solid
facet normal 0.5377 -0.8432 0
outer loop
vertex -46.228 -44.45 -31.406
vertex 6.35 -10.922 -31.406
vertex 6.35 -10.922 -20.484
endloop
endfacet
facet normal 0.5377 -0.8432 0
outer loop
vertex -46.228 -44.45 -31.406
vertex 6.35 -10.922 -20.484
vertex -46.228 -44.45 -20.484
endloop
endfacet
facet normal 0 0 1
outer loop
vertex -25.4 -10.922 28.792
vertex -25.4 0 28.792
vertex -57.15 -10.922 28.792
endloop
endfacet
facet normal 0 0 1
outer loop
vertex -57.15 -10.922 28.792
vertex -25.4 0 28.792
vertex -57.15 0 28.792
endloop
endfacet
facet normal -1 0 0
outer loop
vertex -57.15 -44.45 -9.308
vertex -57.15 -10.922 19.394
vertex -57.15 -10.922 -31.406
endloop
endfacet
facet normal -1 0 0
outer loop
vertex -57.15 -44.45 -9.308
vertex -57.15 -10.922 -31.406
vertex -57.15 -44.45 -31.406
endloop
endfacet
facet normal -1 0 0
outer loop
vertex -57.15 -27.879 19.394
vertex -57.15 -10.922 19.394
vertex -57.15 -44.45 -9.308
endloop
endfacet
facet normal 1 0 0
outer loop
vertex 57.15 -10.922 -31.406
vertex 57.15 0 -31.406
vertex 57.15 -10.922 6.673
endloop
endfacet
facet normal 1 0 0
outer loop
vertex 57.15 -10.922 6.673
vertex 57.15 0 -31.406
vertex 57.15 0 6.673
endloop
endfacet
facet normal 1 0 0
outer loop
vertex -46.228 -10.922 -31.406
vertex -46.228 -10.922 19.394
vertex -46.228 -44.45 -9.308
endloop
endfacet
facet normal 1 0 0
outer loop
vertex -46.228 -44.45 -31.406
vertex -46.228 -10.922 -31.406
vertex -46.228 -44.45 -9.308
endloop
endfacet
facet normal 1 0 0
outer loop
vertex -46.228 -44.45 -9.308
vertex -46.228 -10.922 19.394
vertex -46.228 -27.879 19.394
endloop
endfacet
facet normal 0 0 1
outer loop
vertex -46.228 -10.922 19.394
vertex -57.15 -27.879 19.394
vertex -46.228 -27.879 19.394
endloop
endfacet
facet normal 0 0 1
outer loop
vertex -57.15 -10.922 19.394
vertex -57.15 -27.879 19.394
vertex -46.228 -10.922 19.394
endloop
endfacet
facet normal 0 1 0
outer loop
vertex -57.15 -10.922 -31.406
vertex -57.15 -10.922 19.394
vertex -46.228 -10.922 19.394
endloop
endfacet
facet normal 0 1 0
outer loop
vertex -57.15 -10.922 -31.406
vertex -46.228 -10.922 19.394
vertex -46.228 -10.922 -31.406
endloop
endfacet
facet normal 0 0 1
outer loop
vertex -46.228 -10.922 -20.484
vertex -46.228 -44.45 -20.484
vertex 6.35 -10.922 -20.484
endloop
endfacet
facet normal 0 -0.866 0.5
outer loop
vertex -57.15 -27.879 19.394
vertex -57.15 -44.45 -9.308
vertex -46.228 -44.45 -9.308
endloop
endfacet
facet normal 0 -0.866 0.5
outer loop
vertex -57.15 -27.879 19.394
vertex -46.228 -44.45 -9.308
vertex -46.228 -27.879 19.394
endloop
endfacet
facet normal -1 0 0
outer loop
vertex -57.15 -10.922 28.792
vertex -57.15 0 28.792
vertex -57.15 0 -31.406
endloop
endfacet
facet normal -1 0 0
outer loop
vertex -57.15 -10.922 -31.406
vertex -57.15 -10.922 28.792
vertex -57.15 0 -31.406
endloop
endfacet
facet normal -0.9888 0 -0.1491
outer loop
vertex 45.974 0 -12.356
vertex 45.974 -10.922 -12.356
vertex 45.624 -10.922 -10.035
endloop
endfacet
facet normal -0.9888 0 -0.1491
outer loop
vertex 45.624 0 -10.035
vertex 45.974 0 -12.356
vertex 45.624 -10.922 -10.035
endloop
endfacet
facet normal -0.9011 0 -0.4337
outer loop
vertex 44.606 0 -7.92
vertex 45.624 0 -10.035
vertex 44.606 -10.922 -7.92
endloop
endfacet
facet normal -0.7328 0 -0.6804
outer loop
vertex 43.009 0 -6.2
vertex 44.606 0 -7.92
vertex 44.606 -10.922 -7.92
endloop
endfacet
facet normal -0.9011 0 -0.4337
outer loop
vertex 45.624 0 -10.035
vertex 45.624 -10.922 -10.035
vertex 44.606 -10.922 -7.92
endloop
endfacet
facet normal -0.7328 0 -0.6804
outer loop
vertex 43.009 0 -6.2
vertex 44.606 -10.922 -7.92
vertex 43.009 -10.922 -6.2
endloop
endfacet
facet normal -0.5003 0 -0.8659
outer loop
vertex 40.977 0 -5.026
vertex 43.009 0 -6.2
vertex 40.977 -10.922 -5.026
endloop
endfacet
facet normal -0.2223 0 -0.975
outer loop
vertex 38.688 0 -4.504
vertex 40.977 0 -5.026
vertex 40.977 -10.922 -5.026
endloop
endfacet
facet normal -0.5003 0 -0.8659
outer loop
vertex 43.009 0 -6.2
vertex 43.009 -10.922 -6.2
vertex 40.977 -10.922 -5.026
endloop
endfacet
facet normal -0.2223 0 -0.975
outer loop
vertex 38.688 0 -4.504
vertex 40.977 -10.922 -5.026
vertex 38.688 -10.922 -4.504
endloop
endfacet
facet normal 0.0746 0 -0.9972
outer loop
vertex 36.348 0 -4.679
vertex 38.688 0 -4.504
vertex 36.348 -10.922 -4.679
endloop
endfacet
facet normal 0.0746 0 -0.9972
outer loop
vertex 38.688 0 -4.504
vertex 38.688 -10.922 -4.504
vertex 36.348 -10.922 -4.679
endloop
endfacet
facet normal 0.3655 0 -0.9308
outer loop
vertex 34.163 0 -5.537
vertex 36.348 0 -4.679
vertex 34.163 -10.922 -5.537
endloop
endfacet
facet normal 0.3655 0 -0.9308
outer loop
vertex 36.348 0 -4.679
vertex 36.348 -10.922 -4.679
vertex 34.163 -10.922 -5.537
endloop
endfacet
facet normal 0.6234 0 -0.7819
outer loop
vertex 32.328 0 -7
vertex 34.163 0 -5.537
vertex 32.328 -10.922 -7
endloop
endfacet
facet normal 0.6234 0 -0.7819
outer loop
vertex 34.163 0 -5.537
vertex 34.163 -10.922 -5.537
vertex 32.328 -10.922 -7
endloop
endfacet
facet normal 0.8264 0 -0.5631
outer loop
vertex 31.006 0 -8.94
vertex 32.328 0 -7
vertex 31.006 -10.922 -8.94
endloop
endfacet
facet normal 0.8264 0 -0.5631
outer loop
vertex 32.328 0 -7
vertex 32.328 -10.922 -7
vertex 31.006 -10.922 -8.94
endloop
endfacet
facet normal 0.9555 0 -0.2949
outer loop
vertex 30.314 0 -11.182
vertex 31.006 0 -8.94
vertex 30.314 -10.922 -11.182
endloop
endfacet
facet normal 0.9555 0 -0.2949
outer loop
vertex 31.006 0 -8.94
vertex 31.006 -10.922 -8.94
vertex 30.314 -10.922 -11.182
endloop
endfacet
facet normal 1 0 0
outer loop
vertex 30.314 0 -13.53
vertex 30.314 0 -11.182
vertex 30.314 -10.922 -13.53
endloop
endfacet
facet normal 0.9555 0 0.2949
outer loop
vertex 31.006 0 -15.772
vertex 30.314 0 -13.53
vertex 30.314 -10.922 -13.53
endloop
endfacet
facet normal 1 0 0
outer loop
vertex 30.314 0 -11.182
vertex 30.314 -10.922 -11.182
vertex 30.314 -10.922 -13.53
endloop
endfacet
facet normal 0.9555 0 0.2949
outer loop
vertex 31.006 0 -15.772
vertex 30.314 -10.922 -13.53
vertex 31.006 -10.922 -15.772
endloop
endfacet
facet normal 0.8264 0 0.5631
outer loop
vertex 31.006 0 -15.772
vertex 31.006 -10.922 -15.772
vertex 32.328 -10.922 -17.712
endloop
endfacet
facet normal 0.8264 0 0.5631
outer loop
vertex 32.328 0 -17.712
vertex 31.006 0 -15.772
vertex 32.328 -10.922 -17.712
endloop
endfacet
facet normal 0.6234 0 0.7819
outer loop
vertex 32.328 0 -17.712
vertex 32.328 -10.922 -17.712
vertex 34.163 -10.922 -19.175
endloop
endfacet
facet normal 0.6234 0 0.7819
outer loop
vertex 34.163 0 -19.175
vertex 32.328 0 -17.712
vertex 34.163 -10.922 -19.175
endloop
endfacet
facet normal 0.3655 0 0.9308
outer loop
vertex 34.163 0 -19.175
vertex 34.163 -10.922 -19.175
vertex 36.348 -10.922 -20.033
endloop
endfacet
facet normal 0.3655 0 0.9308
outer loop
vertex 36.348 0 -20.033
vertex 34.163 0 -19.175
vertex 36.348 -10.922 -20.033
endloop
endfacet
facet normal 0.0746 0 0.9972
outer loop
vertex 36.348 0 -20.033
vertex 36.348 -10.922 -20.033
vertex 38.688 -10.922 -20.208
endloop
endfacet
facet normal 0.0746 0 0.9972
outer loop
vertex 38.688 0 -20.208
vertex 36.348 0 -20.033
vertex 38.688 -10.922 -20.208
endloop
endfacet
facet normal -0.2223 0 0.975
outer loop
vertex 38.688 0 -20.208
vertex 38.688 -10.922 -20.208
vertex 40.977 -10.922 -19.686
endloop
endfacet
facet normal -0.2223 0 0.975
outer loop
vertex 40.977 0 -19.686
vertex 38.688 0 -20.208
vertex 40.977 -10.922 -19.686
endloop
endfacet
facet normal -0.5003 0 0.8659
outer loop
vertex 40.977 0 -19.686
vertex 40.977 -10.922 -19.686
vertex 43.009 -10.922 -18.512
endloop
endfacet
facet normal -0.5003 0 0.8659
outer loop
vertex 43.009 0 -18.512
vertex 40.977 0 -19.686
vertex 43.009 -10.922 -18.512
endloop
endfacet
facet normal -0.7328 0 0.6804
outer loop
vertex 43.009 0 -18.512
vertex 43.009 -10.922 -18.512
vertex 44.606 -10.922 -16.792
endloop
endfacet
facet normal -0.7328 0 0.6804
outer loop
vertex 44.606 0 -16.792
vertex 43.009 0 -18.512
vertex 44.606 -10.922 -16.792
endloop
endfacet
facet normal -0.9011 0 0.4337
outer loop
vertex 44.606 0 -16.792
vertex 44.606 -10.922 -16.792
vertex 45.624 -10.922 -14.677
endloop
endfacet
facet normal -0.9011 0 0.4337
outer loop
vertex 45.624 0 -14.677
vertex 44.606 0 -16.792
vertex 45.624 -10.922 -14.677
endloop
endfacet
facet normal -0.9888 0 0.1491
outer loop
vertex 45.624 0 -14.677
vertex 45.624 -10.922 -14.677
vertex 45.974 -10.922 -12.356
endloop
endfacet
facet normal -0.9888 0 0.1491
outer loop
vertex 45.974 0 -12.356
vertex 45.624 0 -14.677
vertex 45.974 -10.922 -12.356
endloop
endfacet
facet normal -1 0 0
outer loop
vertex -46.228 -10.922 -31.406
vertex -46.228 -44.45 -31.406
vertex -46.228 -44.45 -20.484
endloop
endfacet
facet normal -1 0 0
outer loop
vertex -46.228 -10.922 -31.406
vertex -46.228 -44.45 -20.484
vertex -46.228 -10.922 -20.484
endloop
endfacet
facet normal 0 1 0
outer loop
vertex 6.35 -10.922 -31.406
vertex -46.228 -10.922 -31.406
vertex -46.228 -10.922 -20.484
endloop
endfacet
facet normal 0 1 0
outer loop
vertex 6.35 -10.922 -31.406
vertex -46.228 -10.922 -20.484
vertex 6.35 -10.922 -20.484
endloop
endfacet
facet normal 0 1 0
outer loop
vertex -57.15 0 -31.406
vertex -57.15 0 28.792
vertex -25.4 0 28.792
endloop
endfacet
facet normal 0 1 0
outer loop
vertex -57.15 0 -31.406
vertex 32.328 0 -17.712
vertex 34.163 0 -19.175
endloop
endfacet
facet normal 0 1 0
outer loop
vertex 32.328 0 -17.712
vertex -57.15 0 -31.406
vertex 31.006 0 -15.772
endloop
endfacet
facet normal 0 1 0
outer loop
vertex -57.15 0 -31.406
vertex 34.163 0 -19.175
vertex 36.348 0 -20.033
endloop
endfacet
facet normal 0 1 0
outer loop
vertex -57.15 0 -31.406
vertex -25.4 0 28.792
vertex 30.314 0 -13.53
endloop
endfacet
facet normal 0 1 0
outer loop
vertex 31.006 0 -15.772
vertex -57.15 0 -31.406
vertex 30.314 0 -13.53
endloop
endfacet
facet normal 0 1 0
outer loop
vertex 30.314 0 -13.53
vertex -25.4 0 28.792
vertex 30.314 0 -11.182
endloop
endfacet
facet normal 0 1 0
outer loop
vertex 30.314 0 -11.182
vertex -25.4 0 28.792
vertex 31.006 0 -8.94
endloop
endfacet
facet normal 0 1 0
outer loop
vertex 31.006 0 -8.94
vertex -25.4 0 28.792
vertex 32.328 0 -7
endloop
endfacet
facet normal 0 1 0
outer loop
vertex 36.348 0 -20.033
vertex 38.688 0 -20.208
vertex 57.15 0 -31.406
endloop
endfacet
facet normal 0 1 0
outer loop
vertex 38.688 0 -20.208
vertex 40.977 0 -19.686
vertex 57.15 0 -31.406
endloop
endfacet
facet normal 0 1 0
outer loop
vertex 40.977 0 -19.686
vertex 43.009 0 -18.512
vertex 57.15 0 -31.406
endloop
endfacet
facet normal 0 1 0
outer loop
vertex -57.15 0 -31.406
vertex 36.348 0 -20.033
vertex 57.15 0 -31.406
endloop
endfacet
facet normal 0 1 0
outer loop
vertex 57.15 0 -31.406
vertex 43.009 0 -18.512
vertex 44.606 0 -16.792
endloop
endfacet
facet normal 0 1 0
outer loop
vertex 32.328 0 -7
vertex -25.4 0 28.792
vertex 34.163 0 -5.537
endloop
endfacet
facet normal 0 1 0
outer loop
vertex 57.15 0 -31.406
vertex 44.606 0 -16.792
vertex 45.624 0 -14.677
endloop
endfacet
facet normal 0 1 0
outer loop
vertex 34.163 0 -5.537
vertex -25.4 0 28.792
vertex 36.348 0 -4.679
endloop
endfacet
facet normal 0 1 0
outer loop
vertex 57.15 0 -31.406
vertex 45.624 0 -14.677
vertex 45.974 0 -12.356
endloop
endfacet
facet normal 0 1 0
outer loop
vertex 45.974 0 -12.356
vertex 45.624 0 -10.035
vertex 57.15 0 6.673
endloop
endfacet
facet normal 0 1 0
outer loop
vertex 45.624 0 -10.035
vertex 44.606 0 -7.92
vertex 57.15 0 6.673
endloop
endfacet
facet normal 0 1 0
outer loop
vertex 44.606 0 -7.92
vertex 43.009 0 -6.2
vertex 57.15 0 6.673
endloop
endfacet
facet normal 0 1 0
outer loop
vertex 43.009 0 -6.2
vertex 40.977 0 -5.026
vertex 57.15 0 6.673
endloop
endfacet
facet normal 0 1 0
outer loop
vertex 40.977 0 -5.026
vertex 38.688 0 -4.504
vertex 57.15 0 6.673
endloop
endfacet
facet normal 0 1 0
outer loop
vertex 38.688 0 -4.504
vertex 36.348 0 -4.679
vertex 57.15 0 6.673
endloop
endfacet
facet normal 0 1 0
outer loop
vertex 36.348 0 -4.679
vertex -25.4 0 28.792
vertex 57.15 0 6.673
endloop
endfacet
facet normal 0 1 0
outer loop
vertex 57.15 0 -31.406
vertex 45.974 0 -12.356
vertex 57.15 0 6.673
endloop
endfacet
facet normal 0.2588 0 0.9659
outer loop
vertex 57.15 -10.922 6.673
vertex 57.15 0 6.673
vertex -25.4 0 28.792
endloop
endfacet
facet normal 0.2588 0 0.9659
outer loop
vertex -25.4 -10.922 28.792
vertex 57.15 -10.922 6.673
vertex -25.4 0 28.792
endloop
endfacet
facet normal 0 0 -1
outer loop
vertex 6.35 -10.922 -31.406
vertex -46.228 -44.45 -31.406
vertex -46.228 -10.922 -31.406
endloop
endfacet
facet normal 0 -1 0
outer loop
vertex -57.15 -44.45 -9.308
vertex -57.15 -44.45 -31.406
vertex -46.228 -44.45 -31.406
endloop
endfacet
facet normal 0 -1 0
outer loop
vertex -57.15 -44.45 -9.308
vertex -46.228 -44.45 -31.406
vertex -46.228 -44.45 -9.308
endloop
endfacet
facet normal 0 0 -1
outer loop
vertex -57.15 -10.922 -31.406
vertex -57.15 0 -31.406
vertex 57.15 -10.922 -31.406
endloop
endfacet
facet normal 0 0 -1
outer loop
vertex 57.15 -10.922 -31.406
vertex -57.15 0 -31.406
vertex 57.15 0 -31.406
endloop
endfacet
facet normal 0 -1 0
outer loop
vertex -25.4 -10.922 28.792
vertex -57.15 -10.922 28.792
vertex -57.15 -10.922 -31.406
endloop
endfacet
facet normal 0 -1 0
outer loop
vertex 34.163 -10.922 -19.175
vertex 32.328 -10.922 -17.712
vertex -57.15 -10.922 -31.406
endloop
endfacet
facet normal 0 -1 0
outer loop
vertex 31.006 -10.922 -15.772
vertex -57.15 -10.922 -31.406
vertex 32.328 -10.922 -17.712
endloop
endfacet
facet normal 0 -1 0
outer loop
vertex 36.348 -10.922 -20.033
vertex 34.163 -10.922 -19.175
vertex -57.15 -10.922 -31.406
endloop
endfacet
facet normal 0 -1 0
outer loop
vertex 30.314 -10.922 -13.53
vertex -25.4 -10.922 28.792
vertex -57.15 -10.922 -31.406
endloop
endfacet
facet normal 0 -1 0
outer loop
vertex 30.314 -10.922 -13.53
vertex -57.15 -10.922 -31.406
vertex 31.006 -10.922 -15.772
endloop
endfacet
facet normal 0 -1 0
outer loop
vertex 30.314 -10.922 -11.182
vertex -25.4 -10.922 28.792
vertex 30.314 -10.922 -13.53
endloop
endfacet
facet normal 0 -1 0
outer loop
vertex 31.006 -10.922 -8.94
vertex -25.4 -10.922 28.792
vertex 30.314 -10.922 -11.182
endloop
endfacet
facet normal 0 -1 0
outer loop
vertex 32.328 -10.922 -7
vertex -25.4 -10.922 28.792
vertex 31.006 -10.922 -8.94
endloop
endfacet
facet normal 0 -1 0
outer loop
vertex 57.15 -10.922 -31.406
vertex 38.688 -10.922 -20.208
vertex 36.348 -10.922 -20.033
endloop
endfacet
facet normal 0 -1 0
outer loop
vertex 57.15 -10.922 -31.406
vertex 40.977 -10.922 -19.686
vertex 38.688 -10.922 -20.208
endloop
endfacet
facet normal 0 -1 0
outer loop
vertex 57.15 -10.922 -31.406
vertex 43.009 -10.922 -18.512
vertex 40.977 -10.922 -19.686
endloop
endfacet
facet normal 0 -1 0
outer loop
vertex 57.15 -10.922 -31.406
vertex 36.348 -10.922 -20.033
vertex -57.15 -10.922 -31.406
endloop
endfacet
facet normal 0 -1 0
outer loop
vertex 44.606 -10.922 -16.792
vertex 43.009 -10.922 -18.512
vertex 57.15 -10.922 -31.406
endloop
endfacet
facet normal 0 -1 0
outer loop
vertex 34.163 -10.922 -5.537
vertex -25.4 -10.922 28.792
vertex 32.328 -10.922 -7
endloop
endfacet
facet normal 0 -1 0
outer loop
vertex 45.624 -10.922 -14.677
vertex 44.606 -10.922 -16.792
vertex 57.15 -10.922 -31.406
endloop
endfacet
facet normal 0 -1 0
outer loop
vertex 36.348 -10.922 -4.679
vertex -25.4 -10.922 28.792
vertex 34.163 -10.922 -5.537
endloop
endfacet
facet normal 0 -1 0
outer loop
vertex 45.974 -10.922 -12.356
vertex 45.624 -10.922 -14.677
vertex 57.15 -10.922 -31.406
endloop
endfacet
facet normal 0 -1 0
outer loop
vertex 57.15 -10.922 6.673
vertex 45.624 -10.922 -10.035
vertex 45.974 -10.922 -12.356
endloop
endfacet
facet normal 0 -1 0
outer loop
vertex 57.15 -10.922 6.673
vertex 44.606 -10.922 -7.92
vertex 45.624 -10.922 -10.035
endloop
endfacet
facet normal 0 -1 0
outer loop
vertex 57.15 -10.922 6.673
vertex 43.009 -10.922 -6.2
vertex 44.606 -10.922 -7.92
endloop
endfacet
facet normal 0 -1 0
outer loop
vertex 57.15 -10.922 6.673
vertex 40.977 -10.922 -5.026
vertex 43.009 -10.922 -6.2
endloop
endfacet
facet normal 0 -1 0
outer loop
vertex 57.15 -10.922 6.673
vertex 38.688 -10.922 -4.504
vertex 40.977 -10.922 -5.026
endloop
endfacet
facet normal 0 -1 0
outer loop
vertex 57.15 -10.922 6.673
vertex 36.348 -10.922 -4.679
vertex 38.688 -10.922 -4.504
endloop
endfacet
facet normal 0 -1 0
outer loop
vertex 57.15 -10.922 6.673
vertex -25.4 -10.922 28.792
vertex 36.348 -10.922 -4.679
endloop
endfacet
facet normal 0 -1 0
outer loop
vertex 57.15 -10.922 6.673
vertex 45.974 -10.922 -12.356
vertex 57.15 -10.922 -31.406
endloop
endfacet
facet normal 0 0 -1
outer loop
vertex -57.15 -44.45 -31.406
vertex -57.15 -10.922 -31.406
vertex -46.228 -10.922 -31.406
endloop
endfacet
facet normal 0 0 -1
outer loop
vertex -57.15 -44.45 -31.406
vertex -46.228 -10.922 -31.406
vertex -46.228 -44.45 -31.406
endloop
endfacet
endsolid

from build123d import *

# Parameters (mm, degrees)
F1_DEPTH = 10.922
F2_R     = 7.874
F3_DEPTH = 10.923
F5_DEPTH = 10.922
F7_DEPTH = 10.922


with BuildPart() as f1:
    # F0 (on Front) → F1 (new body)
    with BuildSketch(Plane.XZ):
        Polygon((-57.15, -31.405958), (57.15, -31.405958), (57.15, 6.672836), (-25.4, 28.792042), (-57.15, 28.792042), align=None)
    extrude(amount=F1_DEPTH)

    # F2 (on face) → F3 (cut, through all)
    with BuildSketch(Plane.XZ.offset(10.922)):
        with Locations((38.1, -12.355958)):
            Circle(F2_R)
    extrude(amount=-F3_DEPTH, mode=Mode.SUBTRACT)


with BuildPart() as f5:
    # F4 (on face) → F5 (new body)
    with BuildSketch(Plane(origin=(0, 0, -31.405958), x_dir=(1, 0, 0), z_dir=(0, 0, -1))):
        Polygon((-46.228, 44.45), (-46.228, 10.922), (6.35, 10.922), align=None)
    extrude(amount=-F5_DEPTH)


with BuildPart() as f7:
    # F6 (on face) → F7 (new body)
    with BuildSketch(Plane(origin=(-57.15, 0, 0), x_dir=(0, -1, 0), z_dir=(-1, 0, 0))):
        Polygon((10.922, 19.394042), (10.922, -31.405958), (44.45, -31.405958), (44.45, -9.307958), (27.878893, 19.394042), align=None)
    extrude(amount=-F7_DEPTH)


solid = Compound([f1.part, f5.part, f7.part])
